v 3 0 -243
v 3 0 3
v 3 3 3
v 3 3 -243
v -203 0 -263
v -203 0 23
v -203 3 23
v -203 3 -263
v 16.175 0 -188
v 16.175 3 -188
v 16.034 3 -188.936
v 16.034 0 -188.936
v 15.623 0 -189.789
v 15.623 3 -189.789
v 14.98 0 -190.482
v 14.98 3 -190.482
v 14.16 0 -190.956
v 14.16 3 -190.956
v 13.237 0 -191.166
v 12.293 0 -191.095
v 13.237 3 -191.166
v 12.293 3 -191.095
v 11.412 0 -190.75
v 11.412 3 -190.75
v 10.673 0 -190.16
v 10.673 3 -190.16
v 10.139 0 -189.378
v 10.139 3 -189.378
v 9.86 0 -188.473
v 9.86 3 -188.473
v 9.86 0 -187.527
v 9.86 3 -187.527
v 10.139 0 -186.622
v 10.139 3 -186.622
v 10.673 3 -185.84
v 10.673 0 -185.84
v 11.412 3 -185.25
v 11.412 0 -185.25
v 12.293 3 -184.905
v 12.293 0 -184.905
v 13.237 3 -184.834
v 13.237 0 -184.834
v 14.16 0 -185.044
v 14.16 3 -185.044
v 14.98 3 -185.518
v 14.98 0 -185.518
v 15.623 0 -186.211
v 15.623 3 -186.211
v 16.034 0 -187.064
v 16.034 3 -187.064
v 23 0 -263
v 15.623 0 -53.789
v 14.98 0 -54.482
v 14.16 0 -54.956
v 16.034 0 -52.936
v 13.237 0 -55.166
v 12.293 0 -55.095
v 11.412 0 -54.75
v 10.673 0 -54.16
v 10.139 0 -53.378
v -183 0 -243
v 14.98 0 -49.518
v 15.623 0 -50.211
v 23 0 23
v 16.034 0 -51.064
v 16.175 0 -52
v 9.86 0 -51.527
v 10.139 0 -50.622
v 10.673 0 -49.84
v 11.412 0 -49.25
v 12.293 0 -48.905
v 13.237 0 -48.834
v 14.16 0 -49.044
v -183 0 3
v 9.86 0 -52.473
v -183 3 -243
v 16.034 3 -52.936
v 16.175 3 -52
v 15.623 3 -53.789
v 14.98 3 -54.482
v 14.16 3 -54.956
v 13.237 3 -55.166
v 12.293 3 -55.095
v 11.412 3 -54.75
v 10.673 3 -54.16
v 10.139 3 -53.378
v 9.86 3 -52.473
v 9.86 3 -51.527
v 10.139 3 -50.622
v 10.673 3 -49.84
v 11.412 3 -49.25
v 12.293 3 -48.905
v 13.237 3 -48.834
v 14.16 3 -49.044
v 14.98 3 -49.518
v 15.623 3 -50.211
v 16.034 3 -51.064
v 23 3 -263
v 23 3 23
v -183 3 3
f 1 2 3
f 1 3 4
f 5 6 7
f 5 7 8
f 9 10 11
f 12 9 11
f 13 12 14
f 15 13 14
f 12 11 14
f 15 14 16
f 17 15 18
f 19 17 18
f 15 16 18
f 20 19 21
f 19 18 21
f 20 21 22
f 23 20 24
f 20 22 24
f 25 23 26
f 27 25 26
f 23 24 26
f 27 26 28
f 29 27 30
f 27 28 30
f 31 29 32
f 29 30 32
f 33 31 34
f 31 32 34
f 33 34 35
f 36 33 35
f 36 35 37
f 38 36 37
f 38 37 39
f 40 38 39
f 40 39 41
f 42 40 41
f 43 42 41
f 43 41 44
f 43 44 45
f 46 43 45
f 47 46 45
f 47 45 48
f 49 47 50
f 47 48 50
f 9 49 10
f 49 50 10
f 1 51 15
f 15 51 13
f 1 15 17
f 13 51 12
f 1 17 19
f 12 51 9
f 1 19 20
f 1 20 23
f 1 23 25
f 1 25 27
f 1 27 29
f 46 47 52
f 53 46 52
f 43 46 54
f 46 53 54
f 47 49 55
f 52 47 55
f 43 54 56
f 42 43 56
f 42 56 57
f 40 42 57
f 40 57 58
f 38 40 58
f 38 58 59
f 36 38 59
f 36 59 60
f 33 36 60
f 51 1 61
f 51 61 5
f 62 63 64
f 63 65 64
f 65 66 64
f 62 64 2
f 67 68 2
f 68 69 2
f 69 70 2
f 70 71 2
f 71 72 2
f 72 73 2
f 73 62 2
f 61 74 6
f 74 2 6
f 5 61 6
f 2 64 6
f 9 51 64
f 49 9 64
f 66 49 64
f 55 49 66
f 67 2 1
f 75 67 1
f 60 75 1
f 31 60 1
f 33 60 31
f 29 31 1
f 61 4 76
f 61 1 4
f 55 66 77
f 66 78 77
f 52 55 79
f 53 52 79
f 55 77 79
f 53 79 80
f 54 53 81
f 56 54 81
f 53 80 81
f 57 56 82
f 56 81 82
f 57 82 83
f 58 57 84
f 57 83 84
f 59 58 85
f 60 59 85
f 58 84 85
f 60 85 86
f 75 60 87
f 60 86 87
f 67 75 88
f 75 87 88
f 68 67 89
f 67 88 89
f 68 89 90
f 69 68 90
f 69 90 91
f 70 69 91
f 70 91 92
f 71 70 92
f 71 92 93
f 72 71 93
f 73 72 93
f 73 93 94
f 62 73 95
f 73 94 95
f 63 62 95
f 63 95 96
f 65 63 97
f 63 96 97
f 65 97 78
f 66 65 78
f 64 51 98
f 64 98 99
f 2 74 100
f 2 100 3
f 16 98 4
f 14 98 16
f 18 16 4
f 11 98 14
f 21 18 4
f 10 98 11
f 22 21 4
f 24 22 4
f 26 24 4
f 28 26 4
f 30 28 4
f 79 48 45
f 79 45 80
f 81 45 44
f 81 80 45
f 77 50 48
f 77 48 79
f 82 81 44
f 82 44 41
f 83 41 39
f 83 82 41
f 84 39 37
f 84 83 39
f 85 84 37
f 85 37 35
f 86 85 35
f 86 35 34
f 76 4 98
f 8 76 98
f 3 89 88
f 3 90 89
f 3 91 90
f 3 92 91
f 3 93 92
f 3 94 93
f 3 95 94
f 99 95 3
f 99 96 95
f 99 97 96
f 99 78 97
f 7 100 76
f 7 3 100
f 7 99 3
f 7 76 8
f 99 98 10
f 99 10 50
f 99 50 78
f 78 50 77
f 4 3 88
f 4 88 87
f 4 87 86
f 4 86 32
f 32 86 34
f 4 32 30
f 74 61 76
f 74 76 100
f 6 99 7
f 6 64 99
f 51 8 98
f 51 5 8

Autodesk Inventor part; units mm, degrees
ref_plane "YZ Plane" through (0, 0, 0) normal (1, 0, 0) x (0, 1, 0)
ref_plane "XZ Plane" through (0, 0, 0) normal (0, 1, 0) x (-1, 0, 0)
ref_plane "XY Plane" through (0, 0, 0) normal (0, 0, 1) x (1, 0, 0)
sketch "Boceto1" plane through (0, 0, 0) normal (0, 1, 0) x (-1, 0, 0)
  line L0 (0, 0) -> (180, 0)
  line L1 (180, 0) -> (180, -240)
  line L2 (180, -240) -> (0, -240)
  line L3 (0, -240) -> (0, 0)
  line L4 (-3, -243) -> (183, -243)
  line L5 (183, -243) -> (183, 3)
  line L6 (183, 3) -> (-3, 3)
  line L7 (-3, 3) -> (-3, -243)
  line L8 (203, 23) -> (203, -263)
  line L9 (203, -263) -> (-23, -263)
  line L10 (-23, -263) -> (-23, 23)
  line L11 (-23, 23) -> (203, 23)
  dimension "d0" = 180
  dimension "d1" = 240
  dimension "d2" = 3
  dimension "d5" = 20
extrude "Extrusión3" add sketch "Boceto1" along normal blind 3 contours L8 L9 L10 L11
sketch "Boceto6" plane through (0, 3, 0) normal (0, 1, 0) x (1, 0, 0)
  line L0 (-183, -3) -> (-183, 243) projected
  line L1 (-183, 243) -> (3, 243) projected
  line L2 (3, 243) -> (3, -3) projected
  line L3 (3, -3) -> (-183, -3) projected
  line L4 (-203, 263) -> (-203, -23) projected
  line L5 (-203, -23) -> (23, -23) projected
  line L6 (23, -23) -> (23, 263) projected
  line L7 (23, 263) -> (-203, 263) projected
  line L8 (23, 91.3088) -> (23, 114.6899)
  line L9 (3, 114.6899) -> (3, 91.3088)
  circle A0 centre (13, 188) radius 3.175
  circle A1 centre (13, 52) radius 3.175
  point P0 (0, 0)
  dimension "d32" = 6.35
  dimension "d33" = 75
  dimension "d34" = 6.35
  dimension "d35" = 75
extrude "Extrusión8" cut sketch "Boceto6" against normal blind 3 contours A0 | A1
properties part number "Tapa Superior"
